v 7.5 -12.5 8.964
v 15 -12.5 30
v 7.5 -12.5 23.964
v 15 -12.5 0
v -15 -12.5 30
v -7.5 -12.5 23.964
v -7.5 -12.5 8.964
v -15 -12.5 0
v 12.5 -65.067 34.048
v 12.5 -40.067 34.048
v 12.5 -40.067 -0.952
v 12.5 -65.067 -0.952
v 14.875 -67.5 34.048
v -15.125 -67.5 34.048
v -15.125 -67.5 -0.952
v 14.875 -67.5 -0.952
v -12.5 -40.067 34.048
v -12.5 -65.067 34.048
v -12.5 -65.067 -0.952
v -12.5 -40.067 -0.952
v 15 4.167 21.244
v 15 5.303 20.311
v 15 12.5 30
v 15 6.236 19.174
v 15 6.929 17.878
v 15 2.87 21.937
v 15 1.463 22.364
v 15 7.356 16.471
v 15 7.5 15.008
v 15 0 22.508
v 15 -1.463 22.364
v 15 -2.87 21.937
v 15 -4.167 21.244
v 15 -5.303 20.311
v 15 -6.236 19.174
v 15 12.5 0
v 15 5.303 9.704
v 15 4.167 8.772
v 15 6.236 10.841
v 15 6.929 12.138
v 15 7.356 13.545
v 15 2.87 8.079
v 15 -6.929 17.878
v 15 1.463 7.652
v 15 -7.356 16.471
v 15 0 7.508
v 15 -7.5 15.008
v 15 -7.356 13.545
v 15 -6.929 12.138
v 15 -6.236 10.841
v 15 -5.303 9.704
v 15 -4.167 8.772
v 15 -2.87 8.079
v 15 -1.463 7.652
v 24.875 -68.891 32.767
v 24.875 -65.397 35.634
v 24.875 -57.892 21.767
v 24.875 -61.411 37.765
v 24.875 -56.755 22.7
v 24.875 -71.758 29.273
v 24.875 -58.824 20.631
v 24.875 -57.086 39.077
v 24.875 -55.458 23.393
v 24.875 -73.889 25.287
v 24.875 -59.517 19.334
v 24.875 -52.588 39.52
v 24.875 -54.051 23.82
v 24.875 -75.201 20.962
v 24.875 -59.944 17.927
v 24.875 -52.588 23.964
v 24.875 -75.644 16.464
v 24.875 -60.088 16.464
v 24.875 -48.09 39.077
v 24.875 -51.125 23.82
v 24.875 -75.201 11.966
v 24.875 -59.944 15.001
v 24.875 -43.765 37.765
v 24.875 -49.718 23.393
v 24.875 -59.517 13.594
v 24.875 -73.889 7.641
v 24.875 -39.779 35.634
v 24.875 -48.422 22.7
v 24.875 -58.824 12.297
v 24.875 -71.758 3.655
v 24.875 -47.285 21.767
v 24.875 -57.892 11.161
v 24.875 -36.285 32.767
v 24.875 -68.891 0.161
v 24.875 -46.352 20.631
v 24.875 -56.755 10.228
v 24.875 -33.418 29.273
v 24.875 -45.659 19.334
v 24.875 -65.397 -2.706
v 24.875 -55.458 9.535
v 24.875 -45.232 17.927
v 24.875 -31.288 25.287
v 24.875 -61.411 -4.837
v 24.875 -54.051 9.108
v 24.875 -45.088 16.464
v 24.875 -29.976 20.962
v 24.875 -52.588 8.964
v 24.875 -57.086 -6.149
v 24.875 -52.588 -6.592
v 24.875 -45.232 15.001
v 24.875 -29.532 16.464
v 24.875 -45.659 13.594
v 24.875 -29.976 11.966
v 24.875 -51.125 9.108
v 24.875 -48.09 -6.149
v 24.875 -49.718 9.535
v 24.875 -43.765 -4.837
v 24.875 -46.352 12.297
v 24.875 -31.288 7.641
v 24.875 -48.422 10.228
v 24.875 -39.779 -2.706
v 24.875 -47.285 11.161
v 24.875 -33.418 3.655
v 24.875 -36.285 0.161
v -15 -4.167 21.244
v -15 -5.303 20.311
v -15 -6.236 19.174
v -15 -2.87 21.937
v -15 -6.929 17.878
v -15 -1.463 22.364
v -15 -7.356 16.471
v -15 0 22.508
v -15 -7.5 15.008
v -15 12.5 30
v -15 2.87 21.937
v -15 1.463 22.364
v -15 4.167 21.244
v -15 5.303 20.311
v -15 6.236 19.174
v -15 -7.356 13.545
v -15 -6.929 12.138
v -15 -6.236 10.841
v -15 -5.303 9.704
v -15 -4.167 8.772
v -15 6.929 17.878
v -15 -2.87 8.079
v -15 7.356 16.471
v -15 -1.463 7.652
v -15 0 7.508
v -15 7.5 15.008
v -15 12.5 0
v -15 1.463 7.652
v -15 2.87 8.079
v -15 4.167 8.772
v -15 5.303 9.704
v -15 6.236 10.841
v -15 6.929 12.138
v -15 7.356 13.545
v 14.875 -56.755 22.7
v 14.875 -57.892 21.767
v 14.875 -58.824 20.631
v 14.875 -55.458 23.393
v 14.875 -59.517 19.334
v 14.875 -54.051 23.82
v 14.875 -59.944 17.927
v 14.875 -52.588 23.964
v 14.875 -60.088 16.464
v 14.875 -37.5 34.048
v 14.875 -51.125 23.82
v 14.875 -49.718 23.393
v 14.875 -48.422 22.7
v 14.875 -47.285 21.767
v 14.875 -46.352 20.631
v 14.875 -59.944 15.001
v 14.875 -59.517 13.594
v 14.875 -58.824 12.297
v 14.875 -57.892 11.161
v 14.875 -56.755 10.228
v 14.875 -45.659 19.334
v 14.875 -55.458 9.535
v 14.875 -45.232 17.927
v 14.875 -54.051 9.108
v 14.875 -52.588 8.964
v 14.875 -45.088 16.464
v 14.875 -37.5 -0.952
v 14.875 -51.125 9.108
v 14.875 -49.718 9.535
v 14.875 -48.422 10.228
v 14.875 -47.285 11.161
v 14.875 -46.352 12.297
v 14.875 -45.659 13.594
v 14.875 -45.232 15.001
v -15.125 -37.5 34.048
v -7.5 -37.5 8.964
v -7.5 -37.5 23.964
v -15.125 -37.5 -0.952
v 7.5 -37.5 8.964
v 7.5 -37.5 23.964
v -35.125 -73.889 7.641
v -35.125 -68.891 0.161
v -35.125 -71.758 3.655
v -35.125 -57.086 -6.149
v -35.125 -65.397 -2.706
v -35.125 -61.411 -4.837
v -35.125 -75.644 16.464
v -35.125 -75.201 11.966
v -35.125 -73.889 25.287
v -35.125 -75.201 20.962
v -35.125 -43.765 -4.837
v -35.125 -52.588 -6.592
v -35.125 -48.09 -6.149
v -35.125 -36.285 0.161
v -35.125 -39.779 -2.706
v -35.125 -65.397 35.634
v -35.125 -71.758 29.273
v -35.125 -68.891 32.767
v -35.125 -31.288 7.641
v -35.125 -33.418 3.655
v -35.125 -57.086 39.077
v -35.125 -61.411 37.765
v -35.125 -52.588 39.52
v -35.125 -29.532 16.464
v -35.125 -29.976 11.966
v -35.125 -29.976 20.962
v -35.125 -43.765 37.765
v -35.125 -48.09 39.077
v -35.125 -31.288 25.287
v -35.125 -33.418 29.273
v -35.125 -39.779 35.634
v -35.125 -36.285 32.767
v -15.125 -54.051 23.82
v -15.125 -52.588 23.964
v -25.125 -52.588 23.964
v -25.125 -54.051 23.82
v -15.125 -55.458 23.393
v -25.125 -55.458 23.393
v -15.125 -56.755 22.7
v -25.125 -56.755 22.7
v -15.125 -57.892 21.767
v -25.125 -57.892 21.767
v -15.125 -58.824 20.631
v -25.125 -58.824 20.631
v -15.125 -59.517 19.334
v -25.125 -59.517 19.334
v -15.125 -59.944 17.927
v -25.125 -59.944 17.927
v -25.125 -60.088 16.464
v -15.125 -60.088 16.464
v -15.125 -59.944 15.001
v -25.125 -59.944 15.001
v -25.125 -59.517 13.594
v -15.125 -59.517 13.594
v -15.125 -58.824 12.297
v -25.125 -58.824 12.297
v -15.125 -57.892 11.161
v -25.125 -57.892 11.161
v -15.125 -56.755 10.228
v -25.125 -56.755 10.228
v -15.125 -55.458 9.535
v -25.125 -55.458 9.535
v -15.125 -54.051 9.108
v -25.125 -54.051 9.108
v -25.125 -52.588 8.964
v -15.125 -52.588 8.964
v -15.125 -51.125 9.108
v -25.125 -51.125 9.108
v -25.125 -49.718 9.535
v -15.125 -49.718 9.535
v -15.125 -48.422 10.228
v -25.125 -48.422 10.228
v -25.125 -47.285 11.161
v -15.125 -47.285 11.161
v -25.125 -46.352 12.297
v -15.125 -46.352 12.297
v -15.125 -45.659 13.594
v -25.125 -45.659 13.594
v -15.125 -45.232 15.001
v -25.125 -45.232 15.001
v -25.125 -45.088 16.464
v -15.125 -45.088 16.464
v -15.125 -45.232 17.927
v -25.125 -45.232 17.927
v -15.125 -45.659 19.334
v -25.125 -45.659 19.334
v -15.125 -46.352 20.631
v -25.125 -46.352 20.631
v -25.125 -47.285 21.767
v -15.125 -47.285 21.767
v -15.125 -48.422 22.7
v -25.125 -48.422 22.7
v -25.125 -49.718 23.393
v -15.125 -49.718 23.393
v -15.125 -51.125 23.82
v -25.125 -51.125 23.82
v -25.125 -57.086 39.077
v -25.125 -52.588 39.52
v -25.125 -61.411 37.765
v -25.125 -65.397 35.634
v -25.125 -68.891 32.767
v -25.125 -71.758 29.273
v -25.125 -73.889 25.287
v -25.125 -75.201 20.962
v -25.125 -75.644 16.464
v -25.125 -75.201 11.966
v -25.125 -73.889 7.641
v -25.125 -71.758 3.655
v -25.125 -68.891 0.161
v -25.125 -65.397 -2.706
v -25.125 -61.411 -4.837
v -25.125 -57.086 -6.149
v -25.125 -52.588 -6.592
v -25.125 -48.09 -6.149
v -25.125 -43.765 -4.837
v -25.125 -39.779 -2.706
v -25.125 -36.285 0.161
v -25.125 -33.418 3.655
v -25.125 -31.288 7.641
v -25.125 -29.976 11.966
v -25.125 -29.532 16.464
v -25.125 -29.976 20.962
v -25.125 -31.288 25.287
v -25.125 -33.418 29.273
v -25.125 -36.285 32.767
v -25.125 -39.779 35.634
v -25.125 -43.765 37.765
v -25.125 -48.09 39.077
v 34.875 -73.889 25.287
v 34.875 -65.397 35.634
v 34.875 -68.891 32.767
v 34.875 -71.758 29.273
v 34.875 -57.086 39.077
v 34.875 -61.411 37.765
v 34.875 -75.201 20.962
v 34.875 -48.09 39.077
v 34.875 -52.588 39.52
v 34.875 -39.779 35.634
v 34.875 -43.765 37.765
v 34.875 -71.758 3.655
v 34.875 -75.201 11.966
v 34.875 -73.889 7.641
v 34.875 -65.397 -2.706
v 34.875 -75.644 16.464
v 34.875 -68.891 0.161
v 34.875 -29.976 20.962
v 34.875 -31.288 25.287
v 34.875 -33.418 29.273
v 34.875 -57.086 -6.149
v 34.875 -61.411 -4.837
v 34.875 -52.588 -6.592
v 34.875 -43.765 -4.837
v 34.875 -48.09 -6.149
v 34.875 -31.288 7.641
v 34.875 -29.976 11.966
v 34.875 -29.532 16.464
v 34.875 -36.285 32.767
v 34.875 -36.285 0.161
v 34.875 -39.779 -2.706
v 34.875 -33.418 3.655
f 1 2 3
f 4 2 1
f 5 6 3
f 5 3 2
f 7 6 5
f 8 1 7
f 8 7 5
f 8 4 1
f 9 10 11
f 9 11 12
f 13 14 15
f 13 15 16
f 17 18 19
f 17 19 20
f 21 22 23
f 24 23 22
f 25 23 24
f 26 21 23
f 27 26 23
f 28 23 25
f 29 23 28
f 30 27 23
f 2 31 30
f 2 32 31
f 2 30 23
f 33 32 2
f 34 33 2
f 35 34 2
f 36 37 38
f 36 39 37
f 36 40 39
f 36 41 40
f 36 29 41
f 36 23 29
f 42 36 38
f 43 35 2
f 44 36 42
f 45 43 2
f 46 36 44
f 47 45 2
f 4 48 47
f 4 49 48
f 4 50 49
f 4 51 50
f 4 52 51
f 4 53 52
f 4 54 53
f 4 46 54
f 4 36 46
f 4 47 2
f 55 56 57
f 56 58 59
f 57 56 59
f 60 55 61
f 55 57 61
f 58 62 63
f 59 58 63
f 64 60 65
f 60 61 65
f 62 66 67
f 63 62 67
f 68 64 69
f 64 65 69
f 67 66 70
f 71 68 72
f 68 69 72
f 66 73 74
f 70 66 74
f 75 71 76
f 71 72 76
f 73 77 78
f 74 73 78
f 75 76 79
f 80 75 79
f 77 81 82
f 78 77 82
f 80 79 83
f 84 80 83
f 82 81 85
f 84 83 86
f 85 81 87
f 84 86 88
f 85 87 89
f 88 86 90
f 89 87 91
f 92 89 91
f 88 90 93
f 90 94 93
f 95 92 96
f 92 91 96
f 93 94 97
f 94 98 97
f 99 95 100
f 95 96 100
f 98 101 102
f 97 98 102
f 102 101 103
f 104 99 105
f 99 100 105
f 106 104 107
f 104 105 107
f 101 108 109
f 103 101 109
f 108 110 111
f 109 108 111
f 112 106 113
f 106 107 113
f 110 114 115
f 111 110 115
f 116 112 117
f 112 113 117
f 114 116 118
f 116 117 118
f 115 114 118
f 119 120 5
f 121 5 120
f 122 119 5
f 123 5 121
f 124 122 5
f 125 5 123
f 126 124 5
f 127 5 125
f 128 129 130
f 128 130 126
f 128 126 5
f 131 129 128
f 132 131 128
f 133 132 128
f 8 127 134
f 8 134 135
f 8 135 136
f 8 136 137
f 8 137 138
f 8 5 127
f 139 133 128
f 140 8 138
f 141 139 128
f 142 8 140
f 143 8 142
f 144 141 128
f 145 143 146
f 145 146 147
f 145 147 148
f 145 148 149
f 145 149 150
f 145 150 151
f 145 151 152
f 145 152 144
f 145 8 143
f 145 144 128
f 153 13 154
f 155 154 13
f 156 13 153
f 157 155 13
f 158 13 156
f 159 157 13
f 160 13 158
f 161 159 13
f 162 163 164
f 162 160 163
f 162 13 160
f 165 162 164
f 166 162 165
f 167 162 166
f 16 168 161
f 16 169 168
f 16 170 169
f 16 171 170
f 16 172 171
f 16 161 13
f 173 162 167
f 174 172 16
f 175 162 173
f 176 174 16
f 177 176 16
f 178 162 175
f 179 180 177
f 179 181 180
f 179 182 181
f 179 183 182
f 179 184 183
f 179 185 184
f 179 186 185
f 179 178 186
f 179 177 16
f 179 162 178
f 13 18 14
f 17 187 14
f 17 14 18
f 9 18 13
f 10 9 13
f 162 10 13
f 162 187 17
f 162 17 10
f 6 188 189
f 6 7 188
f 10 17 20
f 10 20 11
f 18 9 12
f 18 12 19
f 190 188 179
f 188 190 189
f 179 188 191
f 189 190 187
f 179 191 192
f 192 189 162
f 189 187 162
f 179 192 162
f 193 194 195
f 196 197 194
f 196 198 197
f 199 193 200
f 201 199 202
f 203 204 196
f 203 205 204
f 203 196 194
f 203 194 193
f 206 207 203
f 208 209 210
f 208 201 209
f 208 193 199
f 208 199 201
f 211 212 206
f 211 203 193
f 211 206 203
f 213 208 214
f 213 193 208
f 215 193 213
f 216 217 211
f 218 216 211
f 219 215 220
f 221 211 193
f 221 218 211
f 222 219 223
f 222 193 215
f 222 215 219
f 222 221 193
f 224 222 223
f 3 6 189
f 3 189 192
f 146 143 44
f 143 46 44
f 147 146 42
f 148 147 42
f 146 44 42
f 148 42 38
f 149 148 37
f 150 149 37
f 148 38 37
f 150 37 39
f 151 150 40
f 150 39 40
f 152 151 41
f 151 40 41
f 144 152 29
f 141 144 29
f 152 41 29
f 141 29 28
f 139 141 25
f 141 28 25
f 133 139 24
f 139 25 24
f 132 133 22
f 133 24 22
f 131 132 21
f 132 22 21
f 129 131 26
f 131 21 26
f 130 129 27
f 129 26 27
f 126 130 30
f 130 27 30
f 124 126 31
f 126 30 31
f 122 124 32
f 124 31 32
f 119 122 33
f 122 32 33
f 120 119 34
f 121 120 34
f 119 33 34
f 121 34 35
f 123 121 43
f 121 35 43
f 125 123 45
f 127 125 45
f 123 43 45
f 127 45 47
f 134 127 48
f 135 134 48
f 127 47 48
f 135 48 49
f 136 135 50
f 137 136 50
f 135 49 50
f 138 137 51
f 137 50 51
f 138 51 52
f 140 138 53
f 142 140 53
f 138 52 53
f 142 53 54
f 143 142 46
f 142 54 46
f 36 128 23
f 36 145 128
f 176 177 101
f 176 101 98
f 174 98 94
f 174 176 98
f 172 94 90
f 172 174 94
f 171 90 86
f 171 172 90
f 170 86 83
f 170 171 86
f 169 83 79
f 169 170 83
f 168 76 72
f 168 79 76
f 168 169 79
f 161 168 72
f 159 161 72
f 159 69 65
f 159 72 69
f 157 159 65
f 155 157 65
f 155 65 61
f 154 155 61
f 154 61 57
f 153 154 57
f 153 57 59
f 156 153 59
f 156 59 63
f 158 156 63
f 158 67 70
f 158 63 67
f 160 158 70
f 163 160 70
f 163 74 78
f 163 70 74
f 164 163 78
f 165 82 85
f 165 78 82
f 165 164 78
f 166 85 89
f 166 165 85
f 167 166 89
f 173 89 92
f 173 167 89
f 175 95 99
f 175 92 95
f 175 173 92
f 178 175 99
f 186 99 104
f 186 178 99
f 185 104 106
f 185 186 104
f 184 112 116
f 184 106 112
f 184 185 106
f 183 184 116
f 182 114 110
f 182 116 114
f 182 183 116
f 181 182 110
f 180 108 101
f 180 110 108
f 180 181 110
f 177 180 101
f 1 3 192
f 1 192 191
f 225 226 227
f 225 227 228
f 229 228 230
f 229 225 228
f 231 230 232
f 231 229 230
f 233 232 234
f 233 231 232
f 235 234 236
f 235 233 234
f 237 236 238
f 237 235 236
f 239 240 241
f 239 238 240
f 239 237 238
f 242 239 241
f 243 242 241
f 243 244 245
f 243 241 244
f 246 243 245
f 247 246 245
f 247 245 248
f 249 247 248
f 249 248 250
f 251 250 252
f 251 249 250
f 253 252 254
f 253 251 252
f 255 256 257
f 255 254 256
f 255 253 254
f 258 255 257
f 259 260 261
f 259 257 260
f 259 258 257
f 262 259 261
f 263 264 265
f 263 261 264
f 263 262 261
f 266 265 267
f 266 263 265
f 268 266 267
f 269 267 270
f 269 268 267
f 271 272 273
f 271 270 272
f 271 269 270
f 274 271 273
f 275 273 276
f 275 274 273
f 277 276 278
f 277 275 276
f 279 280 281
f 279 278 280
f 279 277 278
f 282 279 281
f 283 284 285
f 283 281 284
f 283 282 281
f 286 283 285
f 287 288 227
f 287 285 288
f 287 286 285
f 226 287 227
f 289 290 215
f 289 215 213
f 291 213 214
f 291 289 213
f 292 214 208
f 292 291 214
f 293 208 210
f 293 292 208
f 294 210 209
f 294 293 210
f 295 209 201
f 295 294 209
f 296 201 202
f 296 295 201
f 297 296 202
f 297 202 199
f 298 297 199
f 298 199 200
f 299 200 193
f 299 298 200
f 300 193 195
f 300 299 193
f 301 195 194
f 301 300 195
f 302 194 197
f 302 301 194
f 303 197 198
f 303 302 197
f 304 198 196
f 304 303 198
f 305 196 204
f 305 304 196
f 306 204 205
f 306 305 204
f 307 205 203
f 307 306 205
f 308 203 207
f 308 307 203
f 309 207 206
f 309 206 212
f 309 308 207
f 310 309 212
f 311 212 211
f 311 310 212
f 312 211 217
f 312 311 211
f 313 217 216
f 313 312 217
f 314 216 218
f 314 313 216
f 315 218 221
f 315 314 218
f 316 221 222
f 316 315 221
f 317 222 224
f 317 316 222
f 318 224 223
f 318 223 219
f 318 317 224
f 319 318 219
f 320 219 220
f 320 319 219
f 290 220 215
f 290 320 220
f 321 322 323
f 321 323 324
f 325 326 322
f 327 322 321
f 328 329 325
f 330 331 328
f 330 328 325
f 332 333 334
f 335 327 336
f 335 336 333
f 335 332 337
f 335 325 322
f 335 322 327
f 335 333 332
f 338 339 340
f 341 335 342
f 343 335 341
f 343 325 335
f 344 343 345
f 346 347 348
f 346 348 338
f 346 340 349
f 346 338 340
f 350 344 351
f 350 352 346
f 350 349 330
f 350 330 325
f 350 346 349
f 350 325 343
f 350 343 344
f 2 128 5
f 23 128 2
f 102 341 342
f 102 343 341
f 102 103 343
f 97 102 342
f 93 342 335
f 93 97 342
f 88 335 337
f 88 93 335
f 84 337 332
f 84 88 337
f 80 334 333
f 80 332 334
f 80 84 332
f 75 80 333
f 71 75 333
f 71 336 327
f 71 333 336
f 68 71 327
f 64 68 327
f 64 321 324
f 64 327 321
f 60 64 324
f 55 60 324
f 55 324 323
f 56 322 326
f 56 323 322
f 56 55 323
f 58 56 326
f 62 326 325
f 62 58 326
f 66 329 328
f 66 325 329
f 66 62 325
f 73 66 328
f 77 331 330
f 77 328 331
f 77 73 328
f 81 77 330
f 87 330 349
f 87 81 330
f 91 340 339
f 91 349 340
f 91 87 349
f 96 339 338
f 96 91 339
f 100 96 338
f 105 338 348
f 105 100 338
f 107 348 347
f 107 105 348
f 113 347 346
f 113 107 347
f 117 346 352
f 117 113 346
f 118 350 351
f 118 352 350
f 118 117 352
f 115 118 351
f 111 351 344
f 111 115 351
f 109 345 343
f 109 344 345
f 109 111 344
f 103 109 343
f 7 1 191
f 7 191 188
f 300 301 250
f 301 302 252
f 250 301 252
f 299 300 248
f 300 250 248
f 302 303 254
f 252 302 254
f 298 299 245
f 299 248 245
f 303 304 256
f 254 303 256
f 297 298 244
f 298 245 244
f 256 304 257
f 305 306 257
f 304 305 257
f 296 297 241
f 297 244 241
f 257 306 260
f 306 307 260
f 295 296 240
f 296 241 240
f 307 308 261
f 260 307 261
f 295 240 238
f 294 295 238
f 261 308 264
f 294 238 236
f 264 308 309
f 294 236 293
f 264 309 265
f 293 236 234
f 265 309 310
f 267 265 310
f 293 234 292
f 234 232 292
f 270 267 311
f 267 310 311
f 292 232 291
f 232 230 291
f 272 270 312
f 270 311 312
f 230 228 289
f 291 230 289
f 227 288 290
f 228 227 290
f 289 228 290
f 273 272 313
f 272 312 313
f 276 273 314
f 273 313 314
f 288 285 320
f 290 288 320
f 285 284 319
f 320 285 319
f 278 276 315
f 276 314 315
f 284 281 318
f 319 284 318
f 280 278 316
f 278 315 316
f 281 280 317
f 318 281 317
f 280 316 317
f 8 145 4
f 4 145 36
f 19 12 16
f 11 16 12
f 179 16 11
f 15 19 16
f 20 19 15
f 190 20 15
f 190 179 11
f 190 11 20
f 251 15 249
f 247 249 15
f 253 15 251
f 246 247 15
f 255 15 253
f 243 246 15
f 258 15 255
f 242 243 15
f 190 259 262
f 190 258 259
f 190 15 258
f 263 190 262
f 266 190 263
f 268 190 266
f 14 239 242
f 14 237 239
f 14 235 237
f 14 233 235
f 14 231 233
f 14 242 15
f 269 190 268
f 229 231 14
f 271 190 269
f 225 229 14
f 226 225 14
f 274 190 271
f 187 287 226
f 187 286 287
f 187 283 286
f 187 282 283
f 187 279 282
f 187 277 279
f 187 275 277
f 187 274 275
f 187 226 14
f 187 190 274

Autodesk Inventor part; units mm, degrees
ref_plane "YZ Plane" through (0, 0, 0) normal (1, 0, 0) x (0, 1, 0)
ref_plane "XZ Plane" through (0, 0, 0) normal (0, 1, 0) x (-1, 0, 0)
ref_plane "XY Plane" through (0, 0, 0) normal (0, 0, 1) x (1, 0, 0)
sketch "Sketch1" plane through (0, 0, 0) normal (0, 0, 1) x (1, 0, 0)
  line L0 (-15, 12.5) -> (15, 12.5)
  line L1 (15, 12.5) -> (15, -12.5)
  line L2 (15, -12.5) -> (-15, -12.5)
  line L3 (-15, -12.5) -> (-15, 12.5)
  line L4 (-15, 12.5) -> (15, -12.5) construction
  line L5 (15, 12.5) -> (-15, -12.5) construction
  point P0 (0, 0)
  dimension "d0" = 30
  dimension "d1" = 25
extrude "Extrusion1" add sketch "Sketch1" along normal blind 30
sketch "Sketch2" plane through (15, -12.5, 0) normal (1, 0, 0) x (0, 0, -1)
  circle A0 centre (-15.0077, 12.5) radius 7.5
  point P0 (0, 12.5)
  dimension "d4" = 15
extrude "Extrusion2" cut sketch "Sketch2" against normal through all
sketch "Sketch3" plane through (-15, -12.5, 0) normal (0, -1, 0) x (1, 0, 0)
  line L0 (7.5, 23.9638) -> (22.5, 23.9638)
  line L1 (22.5, 23.9638) -> (22.5, 8.9638)
  line L2 (22.5, 8.9638) -> (7.5, 8.9638)
  line L3 (7.5, 8.9638) -> (7.5, 23.9638)
  line L4 (7.5, 23.9638) -> (22.5, 8.9638) construction
  line L5 (22.5, 23.9638) -> (7.5, 8.9638) construction
  point P0 (15, 0)
  point P1 (15, 16.4638)
  dimension "d7" = 15
  dimension "d8" = 15
extrude "Extrusion3" add sketch "Sketch3" along normal blind 25
sketch "Sketch4" plane through (-15, -37.5, 0) normal (0, -1, 0) x (1, 0, 0)
  line L0 (-0.1247, 34.0483) -> (29.8753, 34.0483)
  line L1 (29.8753, 34.0483) -> (29.8753, -0.9517)
  line L2 (29.8753, -0.9517) -> (-0.1247, -0.9517)
  line L3 (-0.1247, -0.9517) -> (-0.1247, 34.0483)
  line L4 (-0.1247, 34.0483) -> (29.8753, -0.9517) construction
  line L5 (29.8753, 34.0483) -> (-0.1247, -0.9517) construction
  point P0 (15, 0)
  point P1 (14.8753, 16.5483)
  dimension "d11" = 30
  dimension "d12" = 35
extrude "Extrusion4" add sketch "Sketch4" along normal blind 30
sketch "Sketch5" plane through (-15.1247, -37.5, -0.9517) normal (-1, 0, 0) x (0, 0, 1)
  circle A0 centre (17.4156, -15.0883) radius 7.5
  point P0 (0.9517, 37.5)
  dimension "d15" = 15
extrude "Extrusion5" add sketch "Sketch5" along normal blind 10
sketch "Sketch6" plane through (14.8753, -37.5, 34.0483) normal (1, 0, 0) x (0, 0, -1)
  circle A0 centre (17.5844, -15.0883) radius 7.5 projected
  circle A1 centre (17.5844, -15.0883) radius 7.5
  point P0 (34.0483, 37.5)
extrude "Extrusion6" add sketch "Sketch6" along normal blind 10
sketch "Sketch7" plane through (-25.1247, -52.5883, 16.4638) normal (-1, 0, 0) x (0, 0, 1)
  line L0 (-17.4156, -14.9117) -> (17.5844, -14.9117) projected
  circle A0 centre (0, 0) radius 23.0558
  point P0 (-16.4638, 52.5883)
extrude "Extrusion7" add sketch "Sketch7" along normal blind 10
sketch "Sketch8" plane through (24.8753, -52.5883, 16.4638) normal (1, 0, 0) x (0, 0, -1)
  circle A0 centre (0, 0) radius 7.5 projected
  circle A1 centre (0, 0) radius 23.0558 projected
  circle A2 centre (0, 0) radius 23.056
  point P0 (16.4638, 52.5883)
  dimension "d22" = 46.112
extrude "Extrusion8" add sketch "Sketch8" along normal blind 10 contours A0 | A1
sketch "Sketch9" plane through (-15.1247, -37.5, 34.0483) normal (0, 0, 1) x (1, 0, 0)
  line L0 (2.6247, -2.5672) -> (27.6247, -2.5672)
  line L1 (27.6247, -2.5672) -> (27.6247, -27.5672)
  line L2 (27.6247, -27.5672) -> (2.6247, -27.5672)
  line L3 (2.6247, -27.5672) -> (2.6247, -2.5672)
  line L4 (2.6247, -2.5672) -> (27.6247, -27.5672) construction
  line L5 (27.6247, -2.5672) -> (2.6247, -27.5672) construction
  point P0 (15.1247, 37.5)
  point P1 (15.1247, -15.0672)
  dimension "d25" = 25
  dimension "d26" = 25
extrude "Extrusion9" cut sketch "Sketch9" against normal through all
properties part number "Part4f"
